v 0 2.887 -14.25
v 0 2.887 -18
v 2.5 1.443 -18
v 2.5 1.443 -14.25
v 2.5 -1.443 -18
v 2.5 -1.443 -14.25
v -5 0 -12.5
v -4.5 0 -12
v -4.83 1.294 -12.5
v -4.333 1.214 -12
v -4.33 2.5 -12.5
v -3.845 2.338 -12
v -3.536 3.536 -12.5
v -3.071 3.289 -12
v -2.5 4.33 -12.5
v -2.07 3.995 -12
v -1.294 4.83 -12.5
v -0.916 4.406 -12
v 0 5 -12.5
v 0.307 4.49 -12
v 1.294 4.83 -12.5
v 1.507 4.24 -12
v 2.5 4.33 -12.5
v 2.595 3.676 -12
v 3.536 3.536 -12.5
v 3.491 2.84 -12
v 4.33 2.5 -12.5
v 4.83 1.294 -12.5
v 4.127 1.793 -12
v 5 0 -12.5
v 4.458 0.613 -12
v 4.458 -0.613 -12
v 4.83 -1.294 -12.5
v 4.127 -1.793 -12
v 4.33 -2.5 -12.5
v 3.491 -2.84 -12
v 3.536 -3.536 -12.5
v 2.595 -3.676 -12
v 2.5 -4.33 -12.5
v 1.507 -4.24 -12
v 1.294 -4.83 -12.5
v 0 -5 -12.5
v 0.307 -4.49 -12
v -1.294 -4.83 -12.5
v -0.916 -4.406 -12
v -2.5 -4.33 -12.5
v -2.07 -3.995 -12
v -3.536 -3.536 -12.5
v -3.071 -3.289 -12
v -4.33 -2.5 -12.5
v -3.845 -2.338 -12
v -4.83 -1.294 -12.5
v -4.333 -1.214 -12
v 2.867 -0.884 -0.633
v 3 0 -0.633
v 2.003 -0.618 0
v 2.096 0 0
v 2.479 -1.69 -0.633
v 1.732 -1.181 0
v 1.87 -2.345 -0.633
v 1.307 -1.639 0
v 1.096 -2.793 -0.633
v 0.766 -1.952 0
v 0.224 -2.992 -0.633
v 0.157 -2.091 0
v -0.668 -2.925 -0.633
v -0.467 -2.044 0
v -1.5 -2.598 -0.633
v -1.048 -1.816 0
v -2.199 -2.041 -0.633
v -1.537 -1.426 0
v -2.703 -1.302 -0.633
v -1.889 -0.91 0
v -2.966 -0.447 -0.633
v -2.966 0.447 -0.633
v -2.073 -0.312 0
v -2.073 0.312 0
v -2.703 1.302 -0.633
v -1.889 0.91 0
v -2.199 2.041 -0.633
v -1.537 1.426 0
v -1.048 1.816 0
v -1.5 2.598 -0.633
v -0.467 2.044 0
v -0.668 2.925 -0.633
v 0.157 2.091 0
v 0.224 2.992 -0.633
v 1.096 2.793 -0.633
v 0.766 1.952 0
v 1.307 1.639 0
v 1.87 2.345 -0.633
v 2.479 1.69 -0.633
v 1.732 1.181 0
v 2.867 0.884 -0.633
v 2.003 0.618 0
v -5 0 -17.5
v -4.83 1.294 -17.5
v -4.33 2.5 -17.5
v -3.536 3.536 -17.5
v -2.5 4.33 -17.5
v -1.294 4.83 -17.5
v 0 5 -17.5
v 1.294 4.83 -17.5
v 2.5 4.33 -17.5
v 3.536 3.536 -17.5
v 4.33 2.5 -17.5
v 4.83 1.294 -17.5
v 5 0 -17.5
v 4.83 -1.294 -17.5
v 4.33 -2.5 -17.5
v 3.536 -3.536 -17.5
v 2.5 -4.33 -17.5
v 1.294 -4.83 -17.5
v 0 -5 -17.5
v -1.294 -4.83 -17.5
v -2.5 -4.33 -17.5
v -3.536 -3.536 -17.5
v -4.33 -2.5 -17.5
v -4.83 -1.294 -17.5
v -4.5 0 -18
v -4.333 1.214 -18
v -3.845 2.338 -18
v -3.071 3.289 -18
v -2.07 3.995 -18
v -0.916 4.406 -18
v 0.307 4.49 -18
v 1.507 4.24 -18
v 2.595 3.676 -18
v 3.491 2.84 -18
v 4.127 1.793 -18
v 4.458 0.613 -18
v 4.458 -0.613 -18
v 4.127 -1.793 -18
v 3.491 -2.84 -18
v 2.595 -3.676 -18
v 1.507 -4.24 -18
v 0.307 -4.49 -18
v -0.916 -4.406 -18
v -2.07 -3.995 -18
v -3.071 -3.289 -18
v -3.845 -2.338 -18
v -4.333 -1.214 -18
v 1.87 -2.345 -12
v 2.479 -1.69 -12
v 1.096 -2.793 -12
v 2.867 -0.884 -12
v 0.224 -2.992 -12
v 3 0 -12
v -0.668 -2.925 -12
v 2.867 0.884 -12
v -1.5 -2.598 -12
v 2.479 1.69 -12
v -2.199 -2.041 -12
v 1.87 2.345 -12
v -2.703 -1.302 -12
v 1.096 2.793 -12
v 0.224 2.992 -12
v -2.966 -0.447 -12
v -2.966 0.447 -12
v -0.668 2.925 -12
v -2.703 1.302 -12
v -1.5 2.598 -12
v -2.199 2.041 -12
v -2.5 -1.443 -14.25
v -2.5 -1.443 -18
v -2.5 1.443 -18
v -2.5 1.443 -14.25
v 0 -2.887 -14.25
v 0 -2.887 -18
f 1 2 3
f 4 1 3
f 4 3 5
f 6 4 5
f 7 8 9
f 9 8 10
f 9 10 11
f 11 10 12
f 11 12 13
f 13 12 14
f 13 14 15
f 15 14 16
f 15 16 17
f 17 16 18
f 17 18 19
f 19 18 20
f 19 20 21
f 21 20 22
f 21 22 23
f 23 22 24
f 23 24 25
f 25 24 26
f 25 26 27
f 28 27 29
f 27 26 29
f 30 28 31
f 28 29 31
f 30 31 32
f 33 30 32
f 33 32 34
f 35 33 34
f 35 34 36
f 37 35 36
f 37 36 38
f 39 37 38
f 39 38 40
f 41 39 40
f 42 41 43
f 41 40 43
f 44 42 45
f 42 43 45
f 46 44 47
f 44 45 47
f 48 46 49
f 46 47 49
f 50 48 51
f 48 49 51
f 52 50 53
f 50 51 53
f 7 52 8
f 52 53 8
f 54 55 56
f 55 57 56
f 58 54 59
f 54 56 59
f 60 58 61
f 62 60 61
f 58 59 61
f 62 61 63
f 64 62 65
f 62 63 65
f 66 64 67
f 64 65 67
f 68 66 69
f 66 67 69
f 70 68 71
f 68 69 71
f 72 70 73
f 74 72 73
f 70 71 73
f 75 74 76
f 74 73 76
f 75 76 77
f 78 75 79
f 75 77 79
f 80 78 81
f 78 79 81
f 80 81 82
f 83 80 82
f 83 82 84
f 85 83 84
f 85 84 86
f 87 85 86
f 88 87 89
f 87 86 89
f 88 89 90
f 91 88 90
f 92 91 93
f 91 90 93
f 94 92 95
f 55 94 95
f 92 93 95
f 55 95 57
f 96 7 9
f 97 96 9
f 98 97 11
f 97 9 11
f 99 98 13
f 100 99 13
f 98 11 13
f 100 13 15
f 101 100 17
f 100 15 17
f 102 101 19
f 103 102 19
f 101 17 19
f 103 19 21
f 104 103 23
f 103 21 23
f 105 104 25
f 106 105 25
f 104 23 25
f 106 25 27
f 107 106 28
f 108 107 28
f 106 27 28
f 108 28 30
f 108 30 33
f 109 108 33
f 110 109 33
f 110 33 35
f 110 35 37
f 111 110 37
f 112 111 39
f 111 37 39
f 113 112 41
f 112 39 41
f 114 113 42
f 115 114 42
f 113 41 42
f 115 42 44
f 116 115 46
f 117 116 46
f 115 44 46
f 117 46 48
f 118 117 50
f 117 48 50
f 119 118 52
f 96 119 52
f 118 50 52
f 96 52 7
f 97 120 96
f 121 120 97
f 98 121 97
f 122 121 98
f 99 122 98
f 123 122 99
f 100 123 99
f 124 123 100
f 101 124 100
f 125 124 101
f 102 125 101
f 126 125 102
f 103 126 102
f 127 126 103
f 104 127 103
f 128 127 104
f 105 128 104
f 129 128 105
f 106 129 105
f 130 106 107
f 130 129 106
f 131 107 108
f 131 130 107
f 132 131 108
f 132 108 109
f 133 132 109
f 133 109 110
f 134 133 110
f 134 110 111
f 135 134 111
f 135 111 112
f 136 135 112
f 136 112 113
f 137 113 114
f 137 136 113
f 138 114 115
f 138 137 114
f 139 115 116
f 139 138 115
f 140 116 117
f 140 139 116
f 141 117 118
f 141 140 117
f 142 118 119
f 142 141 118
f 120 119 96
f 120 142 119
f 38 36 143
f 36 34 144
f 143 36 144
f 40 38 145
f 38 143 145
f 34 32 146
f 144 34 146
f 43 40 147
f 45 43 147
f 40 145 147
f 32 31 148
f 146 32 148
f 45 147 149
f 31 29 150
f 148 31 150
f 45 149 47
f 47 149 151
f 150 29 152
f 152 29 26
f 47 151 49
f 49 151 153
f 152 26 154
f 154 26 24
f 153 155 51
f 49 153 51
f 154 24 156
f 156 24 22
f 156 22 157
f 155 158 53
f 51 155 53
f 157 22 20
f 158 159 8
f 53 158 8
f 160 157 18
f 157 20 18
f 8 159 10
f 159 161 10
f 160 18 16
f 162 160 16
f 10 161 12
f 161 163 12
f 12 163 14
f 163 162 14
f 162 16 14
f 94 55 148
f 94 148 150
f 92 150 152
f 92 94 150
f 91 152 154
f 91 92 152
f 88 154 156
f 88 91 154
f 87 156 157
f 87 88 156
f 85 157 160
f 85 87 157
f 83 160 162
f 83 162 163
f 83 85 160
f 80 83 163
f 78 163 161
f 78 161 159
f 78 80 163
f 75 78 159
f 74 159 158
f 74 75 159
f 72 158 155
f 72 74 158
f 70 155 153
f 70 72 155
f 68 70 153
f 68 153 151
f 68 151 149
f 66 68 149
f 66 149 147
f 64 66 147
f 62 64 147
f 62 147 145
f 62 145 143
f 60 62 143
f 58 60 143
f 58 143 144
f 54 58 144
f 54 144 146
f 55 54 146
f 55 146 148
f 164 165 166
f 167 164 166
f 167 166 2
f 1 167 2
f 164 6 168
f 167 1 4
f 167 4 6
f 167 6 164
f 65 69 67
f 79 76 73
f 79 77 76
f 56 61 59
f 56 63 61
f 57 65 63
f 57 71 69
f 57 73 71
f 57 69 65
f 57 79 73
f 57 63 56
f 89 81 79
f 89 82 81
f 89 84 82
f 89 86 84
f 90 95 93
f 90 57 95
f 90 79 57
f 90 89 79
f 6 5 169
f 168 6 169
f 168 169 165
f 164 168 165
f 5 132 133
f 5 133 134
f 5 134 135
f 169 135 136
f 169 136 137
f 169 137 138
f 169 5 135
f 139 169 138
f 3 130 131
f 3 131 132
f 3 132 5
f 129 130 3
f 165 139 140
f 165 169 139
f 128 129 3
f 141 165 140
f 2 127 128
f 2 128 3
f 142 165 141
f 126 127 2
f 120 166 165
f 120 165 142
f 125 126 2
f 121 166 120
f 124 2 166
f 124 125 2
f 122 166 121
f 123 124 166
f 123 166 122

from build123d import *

# Parameters (mm, degrees)
SKETCH1_R          = 3
EXTRUDE1_DEPTH     = 12
SKETCH6_R          = 5
EXTRUDE2_DEPTH     = 6
CUT_EXTRUDE1_DEPTH = 3.75
CHAMFER1_SIZE      = 0.5


with BuildPart() as part:
    # Sketch1 → Extrude1 (new body)
    with BuildSketch(Plane.XY):
        Circle(SKETCH1_R)
    extrude(amount=-EXTRUDE1_DEPTH)

    # Sketch4 → Cut-Revolve1 (revolve, cut)
    with BuildSketch(Plane(origin=(0, 0, 0), x_dir=(0, 0, -1), z_dir=(1, 0, 0))):
        Polygon((0.632650852, 3), (0, 2.096480947), (0, 3), align=None)
    revolve(axis=Axis((0, 0, 0), (0, 0, -1)), mode=Mode.SUBTRACT)

    # Sketch6 → Extrude2 (add)
    with BuildSketch(Plane(origin=(0, 0, -12), x_dir=(-1, 0, 0), z_dir=(0, 0, -1))):
        Circle(SKETCH6_R)
    extrude(amount=EXTRUDE2_DEPTH)

    # Sketch7 → Cut-Extrude1 (cut)
    with BuildSketch(Plane(origin=(0, 0, -18), x_dir=(-1, 0, 0), z_dir=(0, 0, -1))):
        Polygon((0, 2.886751346), (-2.5, 1.443375673), (-2.5, -1.443375673), (0, -2.886751346), (2.5, -1.443375673), (2.5, 1.443375673), align=None)
    extrude(amount=-CUT_EXTRUDE1_DEPTH, mode=Mode.SUBTRACT)

    # Chamfer1
    chamfer1_edges = [part.edges().sort_by_distance(p)[0] for p in [
        (5, 0, -18),
        (5, 0, -12),
    ]]
    chamfer(chamfer1_edges, length=CHAMFER1_SIZE)


solid = part.part
